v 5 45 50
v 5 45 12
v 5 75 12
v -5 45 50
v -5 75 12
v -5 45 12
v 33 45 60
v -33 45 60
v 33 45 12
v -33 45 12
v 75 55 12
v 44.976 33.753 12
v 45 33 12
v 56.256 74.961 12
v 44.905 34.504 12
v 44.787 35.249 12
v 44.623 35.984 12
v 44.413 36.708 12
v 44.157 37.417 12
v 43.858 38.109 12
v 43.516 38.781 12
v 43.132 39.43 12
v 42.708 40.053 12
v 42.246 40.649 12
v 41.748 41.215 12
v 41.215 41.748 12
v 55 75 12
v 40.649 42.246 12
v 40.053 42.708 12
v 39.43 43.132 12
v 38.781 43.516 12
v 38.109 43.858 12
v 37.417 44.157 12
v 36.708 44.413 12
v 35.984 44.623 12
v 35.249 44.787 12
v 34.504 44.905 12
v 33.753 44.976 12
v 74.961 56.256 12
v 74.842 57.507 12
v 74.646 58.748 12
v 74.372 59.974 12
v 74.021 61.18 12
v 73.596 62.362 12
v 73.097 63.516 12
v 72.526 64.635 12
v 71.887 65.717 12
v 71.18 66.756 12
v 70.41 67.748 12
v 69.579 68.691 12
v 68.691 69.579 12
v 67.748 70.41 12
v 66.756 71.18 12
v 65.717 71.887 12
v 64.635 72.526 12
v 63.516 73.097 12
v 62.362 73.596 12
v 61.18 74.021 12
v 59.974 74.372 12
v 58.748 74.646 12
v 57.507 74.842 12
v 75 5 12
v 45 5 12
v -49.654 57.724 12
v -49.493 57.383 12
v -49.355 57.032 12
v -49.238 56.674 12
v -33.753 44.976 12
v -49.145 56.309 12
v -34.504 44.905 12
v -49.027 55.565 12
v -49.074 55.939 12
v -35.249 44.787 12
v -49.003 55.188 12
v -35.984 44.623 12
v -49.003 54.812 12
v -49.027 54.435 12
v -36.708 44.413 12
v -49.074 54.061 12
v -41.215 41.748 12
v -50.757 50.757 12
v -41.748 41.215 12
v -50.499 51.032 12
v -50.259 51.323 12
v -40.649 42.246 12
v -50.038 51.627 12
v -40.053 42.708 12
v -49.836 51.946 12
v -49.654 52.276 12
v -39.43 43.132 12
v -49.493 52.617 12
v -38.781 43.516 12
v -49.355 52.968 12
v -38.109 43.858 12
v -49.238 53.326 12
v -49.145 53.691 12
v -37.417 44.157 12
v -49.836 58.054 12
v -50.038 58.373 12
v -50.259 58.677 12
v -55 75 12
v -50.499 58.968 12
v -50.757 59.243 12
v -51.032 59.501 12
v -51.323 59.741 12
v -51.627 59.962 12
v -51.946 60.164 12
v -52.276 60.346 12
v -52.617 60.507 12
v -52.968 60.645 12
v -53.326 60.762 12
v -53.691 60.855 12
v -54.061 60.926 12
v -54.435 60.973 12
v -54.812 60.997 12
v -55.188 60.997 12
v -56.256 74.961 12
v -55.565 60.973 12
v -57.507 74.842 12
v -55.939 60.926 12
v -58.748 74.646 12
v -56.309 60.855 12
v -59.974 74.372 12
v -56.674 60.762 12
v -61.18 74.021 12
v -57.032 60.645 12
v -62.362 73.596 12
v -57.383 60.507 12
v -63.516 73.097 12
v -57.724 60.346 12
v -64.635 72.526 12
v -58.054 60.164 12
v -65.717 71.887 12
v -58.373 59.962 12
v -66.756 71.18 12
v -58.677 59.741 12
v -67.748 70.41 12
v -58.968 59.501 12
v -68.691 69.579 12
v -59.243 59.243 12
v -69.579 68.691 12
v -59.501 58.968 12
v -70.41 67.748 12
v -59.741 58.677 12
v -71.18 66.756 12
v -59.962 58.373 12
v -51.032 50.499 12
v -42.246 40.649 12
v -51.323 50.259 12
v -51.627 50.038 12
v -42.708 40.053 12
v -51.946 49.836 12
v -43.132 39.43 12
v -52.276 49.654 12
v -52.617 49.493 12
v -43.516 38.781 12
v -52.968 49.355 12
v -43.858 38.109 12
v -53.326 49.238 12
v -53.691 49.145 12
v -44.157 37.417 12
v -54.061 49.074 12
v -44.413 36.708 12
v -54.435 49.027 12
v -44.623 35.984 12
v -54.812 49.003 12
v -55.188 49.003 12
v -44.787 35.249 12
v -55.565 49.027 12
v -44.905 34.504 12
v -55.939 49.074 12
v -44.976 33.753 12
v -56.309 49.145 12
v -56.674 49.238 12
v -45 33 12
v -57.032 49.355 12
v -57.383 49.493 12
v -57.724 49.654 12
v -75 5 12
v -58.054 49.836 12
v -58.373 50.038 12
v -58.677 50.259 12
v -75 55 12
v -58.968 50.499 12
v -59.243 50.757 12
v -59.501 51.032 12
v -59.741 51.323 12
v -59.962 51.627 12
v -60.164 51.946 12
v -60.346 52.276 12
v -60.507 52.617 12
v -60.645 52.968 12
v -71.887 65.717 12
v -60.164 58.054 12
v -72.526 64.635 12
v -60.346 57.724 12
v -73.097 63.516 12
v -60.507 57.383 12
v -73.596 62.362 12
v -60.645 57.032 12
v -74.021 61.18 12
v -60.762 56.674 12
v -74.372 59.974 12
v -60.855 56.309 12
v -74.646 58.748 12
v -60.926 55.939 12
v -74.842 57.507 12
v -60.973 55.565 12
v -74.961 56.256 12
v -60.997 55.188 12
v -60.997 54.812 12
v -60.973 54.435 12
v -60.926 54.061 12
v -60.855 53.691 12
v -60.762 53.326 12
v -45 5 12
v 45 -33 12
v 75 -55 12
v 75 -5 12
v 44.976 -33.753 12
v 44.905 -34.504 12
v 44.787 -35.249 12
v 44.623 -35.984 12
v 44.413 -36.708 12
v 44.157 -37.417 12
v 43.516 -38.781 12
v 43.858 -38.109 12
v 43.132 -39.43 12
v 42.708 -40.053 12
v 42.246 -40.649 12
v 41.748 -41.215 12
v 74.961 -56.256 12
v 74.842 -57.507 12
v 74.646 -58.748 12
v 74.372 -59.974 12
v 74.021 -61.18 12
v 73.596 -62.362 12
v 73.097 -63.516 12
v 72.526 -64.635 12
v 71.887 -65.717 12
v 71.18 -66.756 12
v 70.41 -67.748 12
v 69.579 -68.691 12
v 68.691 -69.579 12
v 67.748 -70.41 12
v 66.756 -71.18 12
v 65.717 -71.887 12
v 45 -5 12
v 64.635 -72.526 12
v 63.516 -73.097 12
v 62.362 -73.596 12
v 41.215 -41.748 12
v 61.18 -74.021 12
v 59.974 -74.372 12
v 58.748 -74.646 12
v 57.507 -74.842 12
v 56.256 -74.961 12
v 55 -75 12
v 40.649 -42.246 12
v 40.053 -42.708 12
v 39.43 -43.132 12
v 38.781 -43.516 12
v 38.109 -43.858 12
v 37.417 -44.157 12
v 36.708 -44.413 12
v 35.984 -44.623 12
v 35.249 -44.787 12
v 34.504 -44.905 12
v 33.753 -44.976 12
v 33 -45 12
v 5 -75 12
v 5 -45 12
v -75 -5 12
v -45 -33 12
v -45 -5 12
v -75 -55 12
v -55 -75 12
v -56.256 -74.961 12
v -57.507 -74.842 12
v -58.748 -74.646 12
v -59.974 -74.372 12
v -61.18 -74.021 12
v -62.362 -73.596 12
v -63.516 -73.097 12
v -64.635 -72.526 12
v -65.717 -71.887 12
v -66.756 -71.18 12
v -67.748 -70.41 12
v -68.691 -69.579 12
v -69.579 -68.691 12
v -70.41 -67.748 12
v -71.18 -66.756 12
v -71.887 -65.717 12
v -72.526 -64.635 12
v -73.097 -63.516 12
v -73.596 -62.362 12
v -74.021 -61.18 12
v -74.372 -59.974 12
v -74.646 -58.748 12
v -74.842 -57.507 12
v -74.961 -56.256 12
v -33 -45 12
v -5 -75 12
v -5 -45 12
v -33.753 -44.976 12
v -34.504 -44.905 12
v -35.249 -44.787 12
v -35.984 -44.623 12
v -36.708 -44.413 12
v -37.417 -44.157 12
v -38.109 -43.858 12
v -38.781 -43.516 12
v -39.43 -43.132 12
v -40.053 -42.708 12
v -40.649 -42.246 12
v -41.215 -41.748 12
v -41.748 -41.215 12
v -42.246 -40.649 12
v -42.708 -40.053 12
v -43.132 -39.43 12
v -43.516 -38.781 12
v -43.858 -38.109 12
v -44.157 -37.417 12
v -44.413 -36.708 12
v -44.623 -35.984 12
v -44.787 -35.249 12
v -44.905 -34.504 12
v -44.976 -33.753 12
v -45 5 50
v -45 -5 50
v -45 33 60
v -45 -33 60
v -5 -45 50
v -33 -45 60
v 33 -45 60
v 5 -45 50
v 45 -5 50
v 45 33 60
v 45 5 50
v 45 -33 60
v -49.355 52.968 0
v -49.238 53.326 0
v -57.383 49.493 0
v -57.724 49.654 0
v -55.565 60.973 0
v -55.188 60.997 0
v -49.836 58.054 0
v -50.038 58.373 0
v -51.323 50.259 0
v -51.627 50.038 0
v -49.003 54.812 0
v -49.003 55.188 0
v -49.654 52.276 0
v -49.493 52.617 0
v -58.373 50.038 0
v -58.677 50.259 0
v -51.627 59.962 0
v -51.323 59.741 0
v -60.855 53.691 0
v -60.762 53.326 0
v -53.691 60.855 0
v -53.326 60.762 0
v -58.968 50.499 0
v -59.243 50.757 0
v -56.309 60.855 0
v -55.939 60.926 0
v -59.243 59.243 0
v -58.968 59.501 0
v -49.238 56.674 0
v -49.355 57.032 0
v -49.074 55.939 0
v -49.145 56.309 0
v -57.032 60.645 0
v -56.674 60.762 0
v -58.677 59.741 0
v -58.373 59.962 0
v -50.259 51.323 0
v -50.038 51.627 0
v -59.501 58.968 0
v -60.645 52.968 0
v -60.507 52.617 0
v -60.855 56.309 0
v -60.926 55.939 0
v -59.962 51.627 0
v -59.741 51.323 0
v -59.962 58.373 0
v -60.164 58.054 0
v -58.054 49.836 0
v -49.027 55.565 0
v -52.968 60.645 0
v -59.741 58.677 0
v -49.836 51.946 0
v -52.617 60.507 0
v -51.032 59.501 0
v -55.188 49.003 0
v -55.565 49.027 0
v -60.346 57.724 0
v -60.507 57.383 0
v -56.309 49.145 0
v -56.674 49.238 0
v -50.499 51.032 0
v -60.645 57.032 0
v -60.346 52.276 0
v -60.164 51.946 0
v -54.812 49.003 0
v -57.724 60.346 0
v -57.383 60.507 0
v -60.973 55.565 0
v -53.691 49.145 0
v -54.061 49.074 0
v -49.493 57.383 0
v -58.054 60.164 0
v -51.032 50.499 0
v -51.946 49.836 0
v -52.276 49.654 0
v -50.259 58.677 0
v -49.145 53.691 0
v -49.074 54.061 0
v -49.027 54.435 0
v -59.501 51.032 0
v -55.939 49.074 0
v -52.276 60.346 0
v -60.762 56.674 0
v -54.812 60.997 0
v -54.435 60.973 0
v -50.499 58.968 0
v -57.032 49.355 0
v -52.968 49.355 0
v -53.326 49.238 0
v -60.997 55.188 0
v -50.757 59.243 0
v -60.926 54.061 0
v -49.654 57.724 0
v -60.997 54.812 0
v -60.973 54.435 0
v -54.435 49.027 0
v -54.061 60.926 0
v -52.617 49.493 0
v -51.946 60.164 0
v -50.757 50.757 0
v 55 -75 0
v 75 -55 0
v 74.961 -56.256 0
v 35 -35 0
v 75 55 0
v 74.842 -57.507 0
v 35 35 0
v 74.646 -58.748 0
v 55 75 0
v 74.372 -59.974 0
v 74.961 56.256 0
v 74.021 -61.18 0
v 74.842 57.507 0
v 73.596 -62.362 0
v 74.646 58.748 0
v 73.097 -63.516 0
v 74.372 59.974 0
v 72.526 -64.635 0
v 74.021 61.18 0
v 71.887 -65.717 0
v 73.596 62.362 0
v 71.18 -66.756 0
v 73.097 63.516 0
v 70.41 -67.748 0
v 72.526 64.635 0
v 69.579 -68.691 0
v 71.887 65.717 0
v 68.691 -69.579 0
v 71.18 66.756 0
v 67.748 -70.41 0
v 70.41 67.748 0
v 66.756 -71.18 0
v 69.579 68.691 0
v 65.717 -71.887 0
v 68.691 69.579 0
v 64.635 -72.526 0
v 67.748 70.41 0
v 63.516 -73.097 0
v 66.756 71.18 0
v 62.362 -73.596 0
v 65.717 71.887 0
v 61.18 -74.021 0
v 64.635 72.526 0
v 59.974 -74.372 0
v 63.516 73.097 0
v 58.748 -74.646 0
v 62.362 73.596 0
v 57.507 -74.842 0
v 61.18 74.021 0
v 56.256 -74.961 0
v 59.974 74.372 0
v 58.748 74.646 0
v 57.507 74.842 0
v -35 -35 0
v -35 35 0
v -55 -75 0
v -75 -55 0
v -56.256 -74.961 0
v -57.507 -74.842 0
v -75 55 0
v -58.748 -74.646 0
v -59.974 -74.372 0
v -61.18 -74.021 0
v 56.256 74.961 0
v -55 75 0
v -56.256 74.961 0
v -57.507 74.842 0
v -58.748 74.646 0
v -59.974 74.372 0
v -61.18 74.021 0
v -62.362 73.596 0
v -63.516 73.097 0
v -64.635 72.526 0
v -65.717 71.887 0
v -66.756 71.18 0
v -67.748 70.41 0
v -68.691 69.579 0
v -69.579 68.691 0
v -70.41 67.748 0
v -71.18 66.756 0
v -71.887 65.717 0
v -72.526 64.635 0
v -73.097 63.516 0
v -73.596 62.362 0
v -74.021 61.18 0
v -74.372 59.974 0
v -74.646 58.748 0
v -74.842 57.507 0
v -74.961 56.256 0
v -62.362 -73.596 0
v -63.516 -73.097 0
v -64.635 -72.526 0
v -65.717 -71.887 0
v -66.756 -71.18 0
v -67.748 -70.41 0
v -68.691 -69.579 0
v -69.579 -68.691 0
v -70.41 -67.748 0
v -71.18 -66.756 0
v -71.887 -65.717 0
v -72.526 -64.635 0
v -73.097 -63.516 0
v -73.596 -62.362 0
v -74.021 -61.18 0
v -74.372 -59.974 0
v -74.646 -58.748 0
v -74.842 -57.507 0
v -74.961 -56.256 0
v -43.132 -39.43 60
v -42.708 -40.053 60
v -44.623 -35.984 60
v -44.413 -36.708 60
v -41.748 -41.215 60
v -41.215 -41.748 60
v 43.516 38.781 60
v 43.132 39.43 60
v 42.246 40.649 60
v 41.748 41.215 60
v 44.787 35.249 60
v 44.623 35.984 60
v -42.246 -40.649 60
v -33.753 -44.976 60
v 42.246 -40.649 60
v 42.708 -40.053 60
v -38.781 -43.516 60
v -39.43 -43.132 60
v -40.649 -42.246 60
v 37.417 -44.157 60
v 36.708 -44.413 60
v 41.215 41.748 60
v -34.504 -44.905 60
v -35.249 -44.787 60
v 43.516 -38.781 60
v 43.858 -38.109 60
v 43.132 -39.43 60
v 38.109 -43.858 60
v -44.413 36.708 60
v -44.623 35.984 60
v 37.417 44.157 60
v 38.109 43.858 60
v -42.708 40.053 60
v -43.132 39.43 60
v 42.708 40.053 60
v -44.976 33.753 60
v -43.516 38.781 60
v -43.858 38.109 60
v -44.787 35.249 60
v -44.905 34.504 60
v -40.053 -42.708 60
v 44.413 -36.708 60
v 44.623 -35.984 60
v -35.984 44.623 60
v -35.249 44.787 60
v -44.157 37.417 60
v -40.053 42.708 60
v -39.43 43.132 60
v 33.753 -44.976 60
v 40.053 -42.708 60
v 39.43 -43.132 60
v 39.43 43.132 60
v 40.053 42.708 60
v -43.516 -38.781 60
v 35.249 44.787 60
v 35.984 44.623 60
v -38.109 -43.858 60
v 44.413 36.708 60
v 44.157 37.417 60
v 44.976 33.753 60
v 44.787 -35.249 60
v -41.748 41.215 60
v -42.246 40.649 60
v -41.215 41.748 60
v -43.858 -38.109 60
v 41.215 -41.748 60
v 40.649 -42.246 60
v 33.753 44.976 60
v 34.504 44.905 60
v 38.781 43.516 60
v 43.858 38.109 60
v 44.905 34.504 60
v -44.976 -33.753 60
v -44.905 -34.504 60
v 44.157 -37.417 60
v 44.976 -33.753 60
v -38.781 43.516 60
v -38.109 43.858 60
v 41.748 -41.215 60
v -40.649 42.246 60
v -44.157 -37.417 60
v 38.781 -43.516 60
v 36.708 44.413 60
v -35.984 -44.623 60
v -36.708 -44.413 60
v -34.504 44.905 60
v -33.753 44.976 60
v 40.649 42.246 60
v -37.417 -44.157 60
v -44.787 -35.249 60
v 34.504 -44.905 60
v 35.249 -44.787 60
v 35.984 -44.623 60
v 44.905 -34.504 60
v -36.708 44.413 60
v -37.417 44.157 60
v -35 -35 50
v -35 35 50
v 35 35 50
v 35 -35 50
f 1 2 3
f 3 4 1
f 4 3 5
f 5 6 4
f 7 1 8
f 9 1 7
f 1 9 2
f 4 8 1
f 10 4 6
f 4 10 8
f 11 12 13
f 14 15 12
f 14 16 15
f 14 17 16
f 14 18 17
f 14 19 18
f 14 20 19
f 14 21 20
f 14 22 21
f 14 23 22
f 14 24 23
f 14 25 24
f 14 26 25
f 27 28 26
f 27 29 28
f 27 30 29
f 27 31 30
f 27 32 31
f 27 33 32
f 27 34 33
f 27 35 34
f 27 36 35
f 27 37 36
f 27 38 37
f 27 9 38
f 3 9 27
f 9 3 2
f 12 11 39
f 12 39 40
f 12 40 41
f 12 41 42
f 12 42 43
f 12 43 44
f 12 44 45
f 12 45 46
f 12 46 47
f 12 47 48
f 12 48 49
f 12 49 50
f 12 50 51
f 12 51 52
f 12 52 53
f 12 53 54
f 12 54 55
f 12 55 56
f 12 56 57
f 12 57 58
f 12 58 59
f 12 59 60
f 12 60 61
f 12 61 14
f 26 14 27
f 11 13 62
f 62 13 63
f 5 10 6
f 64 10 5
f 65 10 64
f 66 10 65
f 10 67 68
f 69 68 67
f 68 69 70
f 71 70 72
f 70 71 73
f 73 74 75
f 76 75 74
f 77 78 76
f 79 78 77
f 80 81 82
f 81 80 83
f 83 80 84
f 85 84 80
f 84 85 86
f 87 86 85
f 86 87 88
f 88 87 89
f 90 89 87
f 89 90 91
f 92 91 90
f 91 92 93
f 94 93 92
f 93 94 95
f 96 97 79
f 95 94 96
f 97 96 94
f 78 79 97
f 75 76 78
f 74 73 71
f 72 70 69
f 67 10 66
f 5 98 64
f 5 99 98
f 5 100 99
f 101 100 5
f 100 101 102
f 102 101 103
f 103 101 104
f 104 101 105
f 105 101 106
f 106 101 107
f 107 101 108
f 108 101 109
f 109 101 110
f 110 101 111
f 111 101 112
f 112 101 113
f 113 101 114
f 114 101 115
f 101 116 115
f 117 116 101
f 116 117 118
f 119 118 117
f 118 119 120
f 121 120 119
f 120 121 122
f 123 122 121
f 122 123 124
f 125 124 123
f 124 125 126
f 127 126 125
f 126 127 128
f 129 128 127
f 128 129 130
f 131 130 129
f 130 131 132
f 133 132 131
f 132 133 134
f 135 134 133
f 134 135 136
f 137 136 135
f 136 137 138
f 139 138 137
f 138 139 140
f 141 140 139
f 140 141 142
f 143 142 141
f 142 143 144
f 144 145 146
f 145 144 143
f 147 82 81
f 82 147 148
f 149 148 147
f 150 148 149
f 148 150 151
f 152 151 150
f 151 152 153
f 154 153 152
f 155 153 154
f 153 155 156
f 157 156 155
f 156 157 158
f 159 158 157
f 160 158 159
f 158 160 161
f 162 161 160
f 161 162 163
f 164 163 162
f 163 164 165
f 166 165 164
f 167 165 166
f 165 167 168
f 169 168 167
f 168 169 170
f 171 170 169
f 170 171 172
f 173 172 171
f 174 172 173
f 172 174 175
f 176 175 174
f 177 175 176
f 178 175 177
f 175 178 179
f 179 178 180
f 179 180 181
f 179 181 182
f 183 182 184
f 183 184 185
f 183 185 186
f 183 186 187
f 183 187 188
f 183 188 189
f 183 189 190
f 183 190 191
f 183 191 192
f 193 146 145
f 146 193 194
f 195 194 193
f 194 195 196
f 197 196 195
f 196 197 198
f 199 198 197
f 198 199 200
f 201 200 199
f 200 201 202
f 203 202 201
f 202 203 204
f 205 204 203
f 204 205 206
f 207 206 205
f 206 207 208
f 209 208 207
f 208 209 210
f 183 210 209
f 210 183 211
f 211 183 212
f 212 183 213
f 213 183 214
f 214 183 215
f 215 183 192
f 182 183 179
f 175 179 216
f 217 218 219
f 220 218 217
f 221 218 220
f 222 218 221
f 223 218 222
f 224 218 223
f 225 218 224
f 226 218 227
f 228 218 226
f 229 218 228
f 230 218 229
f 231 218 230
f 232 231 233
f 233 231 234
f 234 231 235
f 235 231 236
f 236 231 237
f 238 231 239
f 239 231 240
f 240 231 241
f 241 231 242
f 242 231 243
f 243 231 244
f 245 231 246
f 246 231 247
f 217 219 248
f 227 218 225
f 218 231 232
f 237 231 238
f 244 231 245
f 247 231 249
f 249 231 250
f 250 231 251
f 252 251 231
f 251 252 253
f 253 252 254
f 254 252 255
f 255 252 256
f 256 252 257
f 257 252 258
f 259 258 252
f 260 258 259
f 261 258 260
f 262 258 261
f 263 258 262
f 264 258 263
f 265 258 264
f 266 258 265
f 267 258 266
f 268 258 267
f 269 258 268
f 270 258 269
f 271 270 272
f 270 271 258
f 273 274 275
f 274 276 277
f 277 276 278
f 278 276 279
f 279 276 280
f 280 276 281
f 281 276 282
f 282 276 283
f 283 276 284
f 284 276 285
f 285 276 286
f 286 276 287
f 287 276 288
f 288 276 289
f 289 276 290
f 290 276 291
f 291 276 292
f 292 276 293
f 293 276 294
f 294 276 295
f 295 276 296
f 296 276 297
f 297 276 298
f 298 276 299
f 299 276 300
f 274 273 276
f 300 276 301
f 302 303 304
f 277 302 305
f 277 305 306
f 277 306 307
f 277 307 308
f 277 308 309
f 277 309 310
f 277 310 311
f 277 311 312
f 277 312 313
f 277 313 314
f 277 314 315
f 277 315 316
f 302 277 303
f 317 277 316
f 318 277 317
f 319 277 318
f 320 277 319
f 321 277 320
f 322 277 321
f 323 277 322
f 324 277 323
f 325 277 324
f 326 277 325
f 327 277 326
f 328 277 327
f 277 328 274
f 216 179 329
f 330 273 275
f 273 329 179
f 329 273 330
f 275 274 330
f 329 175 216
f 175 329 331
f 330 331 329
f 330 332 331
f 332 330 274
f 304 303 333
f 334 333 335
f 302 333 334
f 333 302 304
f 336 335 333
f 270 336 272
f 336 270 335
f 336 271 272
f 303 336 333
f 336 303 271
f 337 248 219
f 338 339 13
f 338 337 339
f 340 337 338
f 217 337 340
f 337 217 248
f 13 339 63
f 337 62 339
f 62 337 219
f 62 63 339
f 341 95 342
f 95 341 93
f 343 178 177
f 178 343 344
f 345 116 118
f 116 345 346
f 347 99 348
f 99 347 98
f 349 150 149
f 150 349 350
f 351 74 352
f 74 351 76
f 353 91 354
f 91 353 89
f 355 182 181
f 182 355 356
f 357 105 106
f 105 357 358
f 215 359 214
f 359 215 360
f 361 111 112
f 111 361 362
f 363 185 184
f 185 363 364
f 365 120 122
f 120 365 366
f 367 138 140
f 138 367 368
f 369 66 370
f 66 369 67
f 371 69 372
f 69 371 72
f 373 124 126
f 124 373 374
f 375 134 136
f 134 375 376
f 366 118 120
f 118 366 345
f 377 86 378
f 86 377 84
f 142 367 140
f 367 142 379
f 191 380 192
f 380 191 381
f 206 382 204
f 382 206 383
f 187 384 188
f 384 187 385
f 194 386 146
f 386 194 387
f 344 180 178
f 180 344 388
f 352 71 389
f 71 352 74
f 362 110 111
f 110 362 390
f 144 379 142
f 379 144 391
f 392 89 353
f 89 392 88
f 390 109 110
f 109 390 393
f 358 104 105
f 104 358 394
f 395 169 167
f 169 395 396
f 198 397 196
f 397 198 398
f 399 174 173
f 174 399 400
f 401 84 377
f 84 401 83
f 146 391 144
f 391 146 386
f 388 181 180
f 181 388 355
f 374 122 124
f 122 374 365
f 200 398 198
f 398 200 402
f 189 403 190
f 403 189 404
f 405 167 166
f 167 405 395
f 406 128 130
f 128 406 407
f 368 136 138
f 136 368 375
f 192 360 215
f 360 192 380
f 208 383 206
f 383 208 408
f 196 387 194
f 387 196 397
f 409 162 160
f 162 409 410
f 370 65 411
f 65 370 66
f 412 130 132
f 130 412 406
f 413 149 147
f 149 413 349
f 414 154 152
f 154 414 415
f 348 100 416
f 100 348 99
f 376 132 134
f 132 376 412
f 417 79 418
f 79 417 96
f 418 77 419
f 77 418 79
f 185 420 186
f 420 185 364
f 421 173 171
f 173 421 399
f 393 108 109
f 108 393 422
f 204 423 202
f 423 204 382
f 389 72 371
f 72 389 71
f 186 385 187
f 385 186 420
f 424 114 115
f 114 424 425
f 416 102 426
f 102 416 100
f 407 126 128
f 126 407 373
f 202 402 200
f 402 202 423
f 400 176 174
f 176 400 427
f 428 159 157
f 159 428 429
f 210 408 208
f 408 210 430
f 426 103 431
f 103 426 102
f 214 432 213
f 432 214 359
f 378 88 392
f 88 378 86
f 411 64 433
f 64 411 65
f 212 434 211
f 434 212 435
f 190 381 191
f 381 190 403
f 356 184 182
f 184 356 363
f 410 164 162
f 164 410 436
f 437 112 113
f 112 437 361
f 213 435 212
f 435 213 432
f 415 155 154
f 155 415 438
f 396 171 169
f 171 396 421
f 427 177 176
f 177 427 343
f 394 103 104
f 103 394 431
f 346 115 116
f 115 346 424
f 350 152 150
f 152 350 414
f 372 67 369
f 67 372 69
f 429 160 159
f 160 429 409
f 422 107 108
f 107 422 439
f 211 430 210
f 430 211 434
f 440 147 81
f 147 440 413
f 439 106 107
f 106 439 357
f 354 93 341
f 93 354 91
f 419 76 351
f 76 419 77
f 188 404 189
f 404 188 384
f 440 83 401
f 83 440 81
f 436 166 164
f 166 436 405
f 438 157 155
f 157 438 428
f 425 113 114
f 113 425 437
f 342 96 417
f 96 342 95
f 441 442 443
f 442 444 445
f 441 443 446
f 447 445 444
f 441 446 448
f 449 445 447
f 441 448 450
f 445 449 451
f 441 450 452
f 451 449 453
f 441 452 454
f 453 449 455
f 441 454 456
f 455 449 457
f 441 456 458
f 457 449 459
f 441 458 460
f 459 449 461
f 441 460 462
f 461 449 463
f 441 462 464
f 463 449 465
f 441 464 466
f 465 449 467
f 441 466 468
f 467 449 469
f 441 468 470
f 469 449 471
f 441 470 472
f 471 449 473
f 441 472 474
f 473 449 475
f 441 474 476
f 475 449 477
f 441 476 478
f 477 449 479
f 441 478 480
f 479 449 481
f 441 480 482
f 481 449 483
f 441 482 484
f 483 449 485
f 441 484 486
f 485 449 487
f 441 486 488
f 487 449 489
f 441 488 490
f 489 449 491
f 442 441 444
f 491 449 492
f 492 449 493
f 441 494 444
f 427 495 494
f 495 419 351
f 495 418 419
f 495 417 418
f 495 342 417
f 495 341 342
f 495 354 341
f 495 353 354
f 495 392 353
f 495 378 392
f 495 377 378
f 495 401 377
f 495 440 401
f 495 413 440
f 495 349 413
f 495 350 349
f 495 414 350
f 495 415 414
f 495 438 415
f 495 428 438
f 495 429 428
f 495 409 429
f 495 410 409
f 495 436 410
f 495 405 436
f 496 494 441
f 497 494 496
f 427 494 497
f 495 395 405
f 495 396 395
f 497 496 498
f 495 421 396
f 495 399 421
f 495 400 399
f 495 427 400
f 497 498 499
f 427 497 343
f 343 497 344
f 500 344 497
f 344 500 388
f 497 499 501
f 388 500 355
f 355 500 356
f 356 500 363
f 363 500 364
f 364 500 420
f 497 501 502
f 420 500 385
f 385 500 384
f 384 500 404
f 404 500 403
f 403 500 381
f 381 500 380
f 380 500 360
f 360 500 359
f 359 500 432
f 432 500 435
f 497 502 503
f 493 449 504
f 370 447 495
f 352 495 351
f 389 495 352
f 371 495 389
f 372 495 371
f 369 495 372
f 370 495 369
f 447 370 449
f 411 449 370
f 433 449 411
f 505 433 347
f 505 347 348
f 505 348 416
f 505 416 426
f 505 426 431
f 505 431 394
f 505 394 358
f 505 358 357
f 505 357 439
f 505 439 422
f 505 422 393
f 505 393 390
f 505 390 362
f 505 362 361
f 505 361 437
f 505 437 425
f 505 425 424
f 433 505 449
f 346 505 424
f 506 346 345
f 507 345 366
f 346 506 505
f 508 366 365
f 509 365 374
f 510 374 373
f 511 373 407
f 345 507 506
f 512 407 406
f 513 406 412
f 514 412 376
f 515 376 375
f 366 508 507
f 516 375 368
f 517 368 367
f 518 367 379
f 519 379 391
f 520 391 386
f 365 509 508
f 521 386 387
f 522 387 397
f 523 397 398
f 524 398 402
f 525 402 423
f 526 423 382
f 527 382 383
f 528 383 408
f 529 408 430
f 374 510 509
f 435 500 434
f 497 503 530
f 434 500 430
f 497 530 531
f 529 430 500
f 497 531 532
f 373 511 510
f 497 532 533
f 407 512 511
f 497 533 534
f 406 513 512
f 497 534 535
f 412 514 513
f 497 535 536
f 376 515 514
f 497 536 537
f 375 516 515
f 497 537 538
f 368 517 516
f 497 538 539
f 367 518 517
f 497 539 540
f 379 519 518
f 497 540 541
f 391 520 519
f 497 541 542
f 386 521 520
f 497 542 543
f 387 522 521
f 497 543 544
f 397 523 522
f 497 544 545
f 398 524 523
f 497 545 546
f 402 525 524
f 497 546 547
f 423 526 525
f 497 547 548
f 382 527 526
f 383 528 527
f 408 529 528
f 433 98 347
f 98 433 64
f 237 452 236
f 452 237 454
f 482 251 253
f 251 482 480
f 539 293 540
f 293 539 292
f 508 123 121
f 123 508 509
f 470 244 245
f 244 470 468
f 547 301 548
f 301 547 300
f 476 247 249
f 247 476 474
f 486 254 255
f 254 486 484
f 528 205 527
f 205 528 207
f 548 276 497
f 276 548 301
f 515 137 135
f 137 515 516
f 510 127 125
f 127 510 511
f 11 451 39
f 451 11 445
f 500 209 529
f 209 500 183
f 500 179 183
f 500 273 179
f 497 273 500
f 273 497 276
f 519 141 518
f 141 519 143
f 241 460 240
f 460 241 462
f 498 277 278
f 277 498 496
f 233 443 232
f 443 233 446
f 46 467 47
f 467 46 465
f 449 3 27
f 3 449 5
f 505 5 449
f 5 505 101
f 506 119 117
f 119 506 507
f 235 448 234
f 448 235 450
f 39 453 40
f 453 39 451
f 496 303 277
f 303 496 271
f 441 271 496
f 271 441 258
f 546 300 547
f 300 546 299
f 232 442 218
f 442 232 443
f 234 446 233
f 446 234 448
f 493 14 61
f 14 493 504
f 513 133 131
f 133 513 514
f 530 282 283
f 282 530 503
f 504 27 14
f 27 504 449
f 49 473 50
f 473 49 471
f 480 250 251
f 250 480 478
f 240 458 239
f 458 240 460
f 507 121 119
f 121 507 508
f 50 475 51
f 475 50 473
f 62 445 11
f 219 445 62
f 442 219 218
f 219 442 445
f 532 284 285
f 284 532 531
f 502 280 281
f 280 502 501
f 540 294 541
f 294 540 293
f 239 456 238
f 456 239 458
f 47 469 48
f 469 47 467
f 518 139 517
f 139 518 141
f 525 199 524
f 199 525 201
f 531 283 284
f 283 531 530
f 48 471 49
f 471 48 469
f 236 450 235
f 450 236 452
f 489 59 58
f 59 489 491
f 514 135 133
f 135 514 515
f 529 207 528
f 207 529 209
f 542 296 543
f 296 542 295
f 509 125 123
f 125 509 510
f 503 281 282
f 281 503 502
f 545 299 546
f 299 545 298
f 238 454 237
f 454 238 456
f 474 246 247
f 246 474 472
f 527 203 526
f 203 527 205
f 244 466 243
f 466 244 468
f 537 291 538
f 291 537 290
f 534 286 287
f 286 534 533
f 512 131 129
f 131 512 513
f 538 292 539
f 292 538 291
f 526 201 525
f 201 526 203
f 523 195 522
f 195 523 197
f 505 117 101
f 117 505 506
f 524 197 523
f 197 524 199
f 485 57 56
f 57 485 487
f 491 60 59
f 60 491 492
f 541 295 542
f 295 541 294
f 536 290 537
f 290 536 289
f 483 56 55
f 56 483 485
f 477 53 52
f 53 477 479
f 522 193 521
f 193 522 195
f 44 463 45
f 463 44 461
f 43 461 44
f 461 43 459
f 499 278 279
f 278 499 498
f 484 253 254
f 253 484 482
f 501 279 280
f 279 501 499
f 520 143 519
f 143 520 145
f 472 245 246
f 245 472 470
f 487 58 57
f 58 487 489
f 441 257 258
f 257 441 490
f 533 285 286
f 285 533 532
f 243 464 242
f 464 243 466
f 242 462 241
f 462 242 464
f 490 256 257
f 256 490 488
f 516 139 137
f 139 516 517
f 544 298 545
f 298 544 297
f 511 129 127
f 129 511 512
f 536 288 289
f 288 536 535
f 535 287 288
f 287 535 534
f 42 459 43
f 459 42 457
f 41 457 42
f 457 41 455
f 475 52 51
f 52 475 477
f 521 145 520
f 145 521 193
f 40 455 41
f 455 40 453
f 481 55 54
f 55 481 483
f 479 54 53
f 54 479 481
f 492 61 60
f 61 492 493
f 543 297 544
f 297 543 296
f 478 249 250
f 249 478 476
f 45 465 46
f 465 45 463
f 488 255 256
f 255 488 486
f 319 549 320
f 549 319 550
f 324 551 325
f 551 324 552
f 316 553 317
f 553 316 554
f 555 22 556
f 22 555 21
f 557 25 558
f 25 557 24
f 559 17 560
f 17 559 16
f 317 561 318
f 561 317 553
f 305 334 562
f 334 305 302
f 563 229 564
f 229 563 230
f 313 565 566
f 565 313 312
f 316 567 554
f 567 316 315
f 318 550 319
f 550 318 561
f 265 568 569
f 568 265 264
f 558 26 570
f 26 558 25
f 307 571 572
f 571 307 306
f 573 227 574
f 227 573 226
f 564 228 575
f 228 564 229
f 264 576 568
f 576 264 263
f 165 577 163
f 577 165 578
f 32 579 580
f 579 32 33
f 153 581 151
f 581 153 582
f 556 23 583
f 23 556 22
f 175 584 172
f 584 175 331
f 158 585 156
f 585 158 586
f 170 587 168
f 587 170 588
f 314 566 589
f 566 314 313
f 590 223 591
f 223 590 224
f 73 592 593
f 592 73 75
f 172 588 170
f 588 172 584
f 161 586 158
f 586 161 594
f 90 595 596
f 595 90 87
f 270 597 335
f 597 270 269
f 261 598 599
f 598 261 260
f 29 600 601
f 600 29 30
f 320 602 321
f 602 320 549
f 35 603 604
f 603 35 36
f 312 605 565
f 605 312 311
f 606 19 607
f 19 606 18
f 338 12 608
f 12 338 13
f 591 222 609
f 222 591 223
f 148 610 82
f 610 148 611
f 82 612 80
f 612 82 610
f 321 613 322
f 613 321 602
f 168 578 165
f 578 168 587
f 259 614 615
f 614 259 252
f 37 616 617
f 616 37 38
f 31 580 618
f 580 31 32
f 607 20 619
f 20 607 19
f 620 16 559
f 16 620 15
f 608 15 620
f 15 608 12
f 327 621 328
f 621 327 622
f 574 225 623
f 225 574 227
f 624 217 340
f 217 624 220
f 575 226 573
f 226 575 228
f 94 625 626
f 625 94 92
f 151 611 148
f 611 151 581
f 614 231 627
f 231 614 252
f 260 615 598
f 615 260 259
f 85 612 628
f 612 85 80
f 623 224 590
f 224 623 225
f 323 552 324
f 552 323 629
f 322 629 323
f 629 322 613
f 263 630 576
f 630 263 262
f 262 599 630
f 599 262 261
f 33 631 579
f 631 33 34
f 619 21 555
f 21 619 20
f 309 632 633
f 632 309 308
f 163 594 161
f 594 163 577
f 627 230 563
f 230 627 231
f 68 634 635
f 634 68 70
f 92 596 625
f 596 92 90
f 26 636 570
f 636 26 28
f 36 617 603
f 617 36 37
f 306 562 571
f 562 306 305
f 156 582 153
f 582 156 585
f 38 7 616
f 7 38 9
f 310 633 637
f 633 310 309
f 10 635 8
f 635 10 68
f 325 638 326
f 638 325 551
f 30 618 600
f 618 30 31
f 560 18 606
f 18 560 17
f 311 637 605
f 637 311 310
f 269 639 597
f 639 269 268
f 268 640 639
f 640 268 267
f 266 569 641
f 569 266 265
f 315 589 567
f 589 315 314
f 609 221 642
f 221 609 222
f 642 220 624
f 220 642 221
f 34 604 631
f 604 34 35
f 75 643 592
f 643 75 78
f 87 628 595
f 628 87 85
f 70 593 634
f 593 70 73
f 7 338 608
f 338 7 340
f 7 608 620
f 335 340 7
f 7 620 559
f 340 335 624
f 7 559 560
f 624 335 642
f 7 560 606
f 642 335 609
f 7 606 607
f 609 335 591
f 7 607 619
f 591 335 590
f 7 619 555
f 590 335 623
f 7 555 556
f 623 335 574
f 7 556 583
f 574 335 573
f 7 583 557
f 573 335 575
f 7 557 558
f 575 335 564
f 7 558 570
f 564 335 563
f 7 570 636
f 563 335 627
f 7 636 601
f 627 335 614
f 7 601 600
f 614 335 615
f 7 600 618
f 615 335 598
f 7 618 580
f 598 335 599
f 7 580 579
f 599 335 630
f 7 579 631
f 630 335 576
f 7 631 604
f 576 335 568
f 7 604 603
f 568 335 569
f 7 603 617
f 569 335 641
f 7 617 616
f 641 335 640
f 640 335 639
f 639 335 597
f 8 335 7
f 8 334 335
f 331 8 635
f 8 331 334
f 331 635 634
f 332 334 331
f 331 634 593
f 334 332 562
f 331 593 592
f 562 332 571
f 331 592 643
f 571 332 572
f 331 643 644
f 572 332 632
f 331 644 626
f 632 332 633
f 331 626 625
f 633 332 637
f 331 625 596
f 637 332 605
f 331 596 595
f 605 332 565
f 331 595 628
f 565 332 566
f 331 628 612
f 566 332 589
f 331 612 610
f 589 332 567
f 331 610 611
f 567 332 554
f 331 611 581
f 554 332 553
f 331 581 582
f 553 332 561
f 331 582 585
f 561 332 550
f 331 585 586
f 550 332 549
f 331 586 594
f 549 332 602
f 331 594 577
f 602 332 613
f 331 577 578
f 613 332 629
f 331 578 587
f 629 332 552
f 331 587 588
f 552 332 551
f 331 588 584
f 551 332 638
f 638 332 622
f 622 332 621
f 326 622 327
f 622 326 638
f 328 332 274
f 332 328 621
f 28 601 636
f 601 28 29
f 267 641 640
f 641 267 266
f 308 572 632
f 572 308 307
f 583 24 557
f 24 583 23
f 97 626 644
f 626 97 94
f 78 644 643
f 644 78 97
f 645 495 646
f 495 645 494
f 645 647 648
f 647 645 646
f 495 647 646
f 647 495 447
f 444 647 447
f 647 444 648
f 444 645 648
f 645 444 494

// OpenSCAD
// file: Library_2021.scad
$fn = 100;//This number should normally be around or at 100.


//===========================================================================================================================
//===========================================================================================================================
module sqaure_torus(outerXlength, outerYlength, innerXlength, innerYlength, obritalDis, angleHere){//Sqaure torus
rotate_extrude(angle = angleHere,convexity = 10){
translate([obritalDis + outerXlength / 2, outerYlength / 2, 0])
    difference(){
        square([outerXlength, outerYlength], center = true);
        square([innerXlength, innerYlength], center = true);
        
        }
    }
}
//===========================================================================================================================
//===========================================================================================================================
module torus(outerRadius, innerRadius, orbitalDistance, angleHere){// Donut shape
    rotate_extrude(angle= angleHere, convexity= 10){
        translate([orbitalDistance, 0, 0])
            difference(){
                circle(outerRadius);
                circle(innerRadius);
                }
        }
    assert(angleHere <= 360, "angle is greater than 360!");
    assert(outerRadius > innerRadius, "Inner circle is greater than outer circle!");
    assert(orbitalDistance > 0, "orbital radius is less than zero!");
    }
//===========================================================================================================================
//===========================================================================================================================
module orbital_cylinders(OrbitalRadius, NumberOfCylinders, cylinderRadius, Height, Xtilt, Ytilt){// cuts circles in a circle
    for (Hole = [0:NumberOfCylinders]){
        rotate([0, 0, 360/NumberOfCylinders])
        translate([OrbitalRadius, 0, 0])
        rotate([Xtilt, Ytilt,0])
            cylinder(Height, r= cylinderRadius);
        }
    }
//===========================================================================================================================
//===========================================================================================================================
module annulus(OuterRadius, InnerRadius, Height){//Pipe shape
    differnce(){
        //Prime object
        cylinder(Height, r= OuterRadius);
        //Cutting object(s)
        cylinder(Height, r= InnerRadius);
        }
    }
//==========================================================================================================================
//==========================================================================================================================
module ceinture(OuterRadius, InnerRadius, Height, BetweenCenters){// Belt shape
    difference(){
        hull(){//Prime object
            cylinder(Height, r= outerRadius);
            translate([BetweenCenters, 0, 0])
                cylinder(Height, r= outerRadius);
            }
        hull(){//Cutting object
            cylinder(Height, r= InnerRadius);
            translate([BetweenCenters, 0, 0])
                cylinder(Height, r= InnerRadius);
            }
        }
    }
//==========================================================================================================================
//==========================================================================================================================
module triangle(type, leg_a, leg_b,hypotenuse){// draws right, scalene, isosceles and equilateral triangles
    if(type == "right"){
        polygon( points = [[0, 0],[leg_a, 0],[0, leg_b]]);
            }
        else if(type == "scalene"){
            hypotenuse = sqrt(pow(leg_a, 2) + pow(leg_b, 2));
                polygon(points = [[0,-(leg_a/2)],[leg_b,0],[0,hypotenuse]]);
            }
        else if(type == "isosceles"){
                polygon(points = [[0,-(leg_a/2)],[leg_b,0],[0,(leg_a/2)]]);
            }
        else if(type == "equilateral"){
                polygon(points = [[0,-(leg_a/2)],[leg_a,0],[0,leg_a]]);
            }
    }
//==========================================================================================================================
//==========================================================================================================================
module _name_(){}
//==========================================================================================================================
//==========================================================================================================================
module _name_(){}
//==========================================================================================================================
//==========================================================================================================================
module _name_(){}
//==========================================================================================================================
//==========================================================================================================================
// main file
$fn = 100;
mm = 1;
in = 25.4 * mm;
u = 1;
degree = 1;
diameter = .5;
p1=$preview?1+1/$fn:1;
use <Library_2021.scad>

Part_145();


module Part_145(){
#Strut();
    difference(){
        union(){

            difference(){
                BasePlate();
                    ThroughCuts();

            }
            #Monolith();
        }
        UnderMonolithCut();
    }

    //BasePlate Variables
        BasePlateXY = 110 * u;
        BasePlateZ = 12 * u;
    
    //Monolith Variables
        MonolithRadius = 12 * u;
        MonolithXY = (90 - (MonolithRadius * 2)) * u;
        MonolithZ = 60 * u;
    
    module BasePlate(){
        PlateRadius = 20 * u;
        
        linear_extrude(height= BasePlateZ)
        projection(cut= true)
        minkowski(){
            cube([BasePlateXY, BasePlateXY, BasePlateZ], center= true);
            cylinder(r= PlateRadius, BasePlateZ);
            }
        }
    module Monolith(){
        linear_extrude(height= MonolithZ)
        projection(cut= true)
        minkowski(){
            cube([MonolithXY, MonolithXY, MonolithZ], center= true);
            cylinder(r= MonolithRadius, MonolithZ);
            }
        
        }
    module ThroughCuts(){
        ThroHoleDiameter = 12 * diameter * u;
        // Puts hole in the right distance
        a = BasePlateXY;
        b = BasePlateXY;
        c = pow(BasePlateXY, 2);
        h = sqrt((pow(a, 2) + pow(b, 2)));
        h_2 = pow((h / 2), 2);
        // ==============================
        HoleRadius = sqrt(c - h_2) * u;
        rotate([0,0, 45])
        orbital_cylinders(OrbitalRadius= HoleRadius, NumberOfCylinders= 4, cylinderRadius= ThroHoleDiameter, Height= BasePlateZ, Xtilt= 0, Ytilt= 0);
        }
    module UnderMonolithCut(){
        UnderCubeXY = 70 * u;
        UnderCubeZ = 50 * u;
        linear_extrude(height= UnderCubeZ)
            square(UnderCubeXY, center= true);
        }
    module Strut(){
        overAllD = 150 / 2;
        leg_a = 38;
        leg_b = 30;
        Height = 10 * u;
        for(strutPlacement = [0:90:360]){
            rotate([0, -90, strutPlacement])
            translate([BasePlateZ, overAllD - leg_b, 0])
                linear_extrude(height= Height, center= true)
                    polygon(points = [[0, 0],[leg_a, 0],[0, leg_b]]);
        }
        }
    }
